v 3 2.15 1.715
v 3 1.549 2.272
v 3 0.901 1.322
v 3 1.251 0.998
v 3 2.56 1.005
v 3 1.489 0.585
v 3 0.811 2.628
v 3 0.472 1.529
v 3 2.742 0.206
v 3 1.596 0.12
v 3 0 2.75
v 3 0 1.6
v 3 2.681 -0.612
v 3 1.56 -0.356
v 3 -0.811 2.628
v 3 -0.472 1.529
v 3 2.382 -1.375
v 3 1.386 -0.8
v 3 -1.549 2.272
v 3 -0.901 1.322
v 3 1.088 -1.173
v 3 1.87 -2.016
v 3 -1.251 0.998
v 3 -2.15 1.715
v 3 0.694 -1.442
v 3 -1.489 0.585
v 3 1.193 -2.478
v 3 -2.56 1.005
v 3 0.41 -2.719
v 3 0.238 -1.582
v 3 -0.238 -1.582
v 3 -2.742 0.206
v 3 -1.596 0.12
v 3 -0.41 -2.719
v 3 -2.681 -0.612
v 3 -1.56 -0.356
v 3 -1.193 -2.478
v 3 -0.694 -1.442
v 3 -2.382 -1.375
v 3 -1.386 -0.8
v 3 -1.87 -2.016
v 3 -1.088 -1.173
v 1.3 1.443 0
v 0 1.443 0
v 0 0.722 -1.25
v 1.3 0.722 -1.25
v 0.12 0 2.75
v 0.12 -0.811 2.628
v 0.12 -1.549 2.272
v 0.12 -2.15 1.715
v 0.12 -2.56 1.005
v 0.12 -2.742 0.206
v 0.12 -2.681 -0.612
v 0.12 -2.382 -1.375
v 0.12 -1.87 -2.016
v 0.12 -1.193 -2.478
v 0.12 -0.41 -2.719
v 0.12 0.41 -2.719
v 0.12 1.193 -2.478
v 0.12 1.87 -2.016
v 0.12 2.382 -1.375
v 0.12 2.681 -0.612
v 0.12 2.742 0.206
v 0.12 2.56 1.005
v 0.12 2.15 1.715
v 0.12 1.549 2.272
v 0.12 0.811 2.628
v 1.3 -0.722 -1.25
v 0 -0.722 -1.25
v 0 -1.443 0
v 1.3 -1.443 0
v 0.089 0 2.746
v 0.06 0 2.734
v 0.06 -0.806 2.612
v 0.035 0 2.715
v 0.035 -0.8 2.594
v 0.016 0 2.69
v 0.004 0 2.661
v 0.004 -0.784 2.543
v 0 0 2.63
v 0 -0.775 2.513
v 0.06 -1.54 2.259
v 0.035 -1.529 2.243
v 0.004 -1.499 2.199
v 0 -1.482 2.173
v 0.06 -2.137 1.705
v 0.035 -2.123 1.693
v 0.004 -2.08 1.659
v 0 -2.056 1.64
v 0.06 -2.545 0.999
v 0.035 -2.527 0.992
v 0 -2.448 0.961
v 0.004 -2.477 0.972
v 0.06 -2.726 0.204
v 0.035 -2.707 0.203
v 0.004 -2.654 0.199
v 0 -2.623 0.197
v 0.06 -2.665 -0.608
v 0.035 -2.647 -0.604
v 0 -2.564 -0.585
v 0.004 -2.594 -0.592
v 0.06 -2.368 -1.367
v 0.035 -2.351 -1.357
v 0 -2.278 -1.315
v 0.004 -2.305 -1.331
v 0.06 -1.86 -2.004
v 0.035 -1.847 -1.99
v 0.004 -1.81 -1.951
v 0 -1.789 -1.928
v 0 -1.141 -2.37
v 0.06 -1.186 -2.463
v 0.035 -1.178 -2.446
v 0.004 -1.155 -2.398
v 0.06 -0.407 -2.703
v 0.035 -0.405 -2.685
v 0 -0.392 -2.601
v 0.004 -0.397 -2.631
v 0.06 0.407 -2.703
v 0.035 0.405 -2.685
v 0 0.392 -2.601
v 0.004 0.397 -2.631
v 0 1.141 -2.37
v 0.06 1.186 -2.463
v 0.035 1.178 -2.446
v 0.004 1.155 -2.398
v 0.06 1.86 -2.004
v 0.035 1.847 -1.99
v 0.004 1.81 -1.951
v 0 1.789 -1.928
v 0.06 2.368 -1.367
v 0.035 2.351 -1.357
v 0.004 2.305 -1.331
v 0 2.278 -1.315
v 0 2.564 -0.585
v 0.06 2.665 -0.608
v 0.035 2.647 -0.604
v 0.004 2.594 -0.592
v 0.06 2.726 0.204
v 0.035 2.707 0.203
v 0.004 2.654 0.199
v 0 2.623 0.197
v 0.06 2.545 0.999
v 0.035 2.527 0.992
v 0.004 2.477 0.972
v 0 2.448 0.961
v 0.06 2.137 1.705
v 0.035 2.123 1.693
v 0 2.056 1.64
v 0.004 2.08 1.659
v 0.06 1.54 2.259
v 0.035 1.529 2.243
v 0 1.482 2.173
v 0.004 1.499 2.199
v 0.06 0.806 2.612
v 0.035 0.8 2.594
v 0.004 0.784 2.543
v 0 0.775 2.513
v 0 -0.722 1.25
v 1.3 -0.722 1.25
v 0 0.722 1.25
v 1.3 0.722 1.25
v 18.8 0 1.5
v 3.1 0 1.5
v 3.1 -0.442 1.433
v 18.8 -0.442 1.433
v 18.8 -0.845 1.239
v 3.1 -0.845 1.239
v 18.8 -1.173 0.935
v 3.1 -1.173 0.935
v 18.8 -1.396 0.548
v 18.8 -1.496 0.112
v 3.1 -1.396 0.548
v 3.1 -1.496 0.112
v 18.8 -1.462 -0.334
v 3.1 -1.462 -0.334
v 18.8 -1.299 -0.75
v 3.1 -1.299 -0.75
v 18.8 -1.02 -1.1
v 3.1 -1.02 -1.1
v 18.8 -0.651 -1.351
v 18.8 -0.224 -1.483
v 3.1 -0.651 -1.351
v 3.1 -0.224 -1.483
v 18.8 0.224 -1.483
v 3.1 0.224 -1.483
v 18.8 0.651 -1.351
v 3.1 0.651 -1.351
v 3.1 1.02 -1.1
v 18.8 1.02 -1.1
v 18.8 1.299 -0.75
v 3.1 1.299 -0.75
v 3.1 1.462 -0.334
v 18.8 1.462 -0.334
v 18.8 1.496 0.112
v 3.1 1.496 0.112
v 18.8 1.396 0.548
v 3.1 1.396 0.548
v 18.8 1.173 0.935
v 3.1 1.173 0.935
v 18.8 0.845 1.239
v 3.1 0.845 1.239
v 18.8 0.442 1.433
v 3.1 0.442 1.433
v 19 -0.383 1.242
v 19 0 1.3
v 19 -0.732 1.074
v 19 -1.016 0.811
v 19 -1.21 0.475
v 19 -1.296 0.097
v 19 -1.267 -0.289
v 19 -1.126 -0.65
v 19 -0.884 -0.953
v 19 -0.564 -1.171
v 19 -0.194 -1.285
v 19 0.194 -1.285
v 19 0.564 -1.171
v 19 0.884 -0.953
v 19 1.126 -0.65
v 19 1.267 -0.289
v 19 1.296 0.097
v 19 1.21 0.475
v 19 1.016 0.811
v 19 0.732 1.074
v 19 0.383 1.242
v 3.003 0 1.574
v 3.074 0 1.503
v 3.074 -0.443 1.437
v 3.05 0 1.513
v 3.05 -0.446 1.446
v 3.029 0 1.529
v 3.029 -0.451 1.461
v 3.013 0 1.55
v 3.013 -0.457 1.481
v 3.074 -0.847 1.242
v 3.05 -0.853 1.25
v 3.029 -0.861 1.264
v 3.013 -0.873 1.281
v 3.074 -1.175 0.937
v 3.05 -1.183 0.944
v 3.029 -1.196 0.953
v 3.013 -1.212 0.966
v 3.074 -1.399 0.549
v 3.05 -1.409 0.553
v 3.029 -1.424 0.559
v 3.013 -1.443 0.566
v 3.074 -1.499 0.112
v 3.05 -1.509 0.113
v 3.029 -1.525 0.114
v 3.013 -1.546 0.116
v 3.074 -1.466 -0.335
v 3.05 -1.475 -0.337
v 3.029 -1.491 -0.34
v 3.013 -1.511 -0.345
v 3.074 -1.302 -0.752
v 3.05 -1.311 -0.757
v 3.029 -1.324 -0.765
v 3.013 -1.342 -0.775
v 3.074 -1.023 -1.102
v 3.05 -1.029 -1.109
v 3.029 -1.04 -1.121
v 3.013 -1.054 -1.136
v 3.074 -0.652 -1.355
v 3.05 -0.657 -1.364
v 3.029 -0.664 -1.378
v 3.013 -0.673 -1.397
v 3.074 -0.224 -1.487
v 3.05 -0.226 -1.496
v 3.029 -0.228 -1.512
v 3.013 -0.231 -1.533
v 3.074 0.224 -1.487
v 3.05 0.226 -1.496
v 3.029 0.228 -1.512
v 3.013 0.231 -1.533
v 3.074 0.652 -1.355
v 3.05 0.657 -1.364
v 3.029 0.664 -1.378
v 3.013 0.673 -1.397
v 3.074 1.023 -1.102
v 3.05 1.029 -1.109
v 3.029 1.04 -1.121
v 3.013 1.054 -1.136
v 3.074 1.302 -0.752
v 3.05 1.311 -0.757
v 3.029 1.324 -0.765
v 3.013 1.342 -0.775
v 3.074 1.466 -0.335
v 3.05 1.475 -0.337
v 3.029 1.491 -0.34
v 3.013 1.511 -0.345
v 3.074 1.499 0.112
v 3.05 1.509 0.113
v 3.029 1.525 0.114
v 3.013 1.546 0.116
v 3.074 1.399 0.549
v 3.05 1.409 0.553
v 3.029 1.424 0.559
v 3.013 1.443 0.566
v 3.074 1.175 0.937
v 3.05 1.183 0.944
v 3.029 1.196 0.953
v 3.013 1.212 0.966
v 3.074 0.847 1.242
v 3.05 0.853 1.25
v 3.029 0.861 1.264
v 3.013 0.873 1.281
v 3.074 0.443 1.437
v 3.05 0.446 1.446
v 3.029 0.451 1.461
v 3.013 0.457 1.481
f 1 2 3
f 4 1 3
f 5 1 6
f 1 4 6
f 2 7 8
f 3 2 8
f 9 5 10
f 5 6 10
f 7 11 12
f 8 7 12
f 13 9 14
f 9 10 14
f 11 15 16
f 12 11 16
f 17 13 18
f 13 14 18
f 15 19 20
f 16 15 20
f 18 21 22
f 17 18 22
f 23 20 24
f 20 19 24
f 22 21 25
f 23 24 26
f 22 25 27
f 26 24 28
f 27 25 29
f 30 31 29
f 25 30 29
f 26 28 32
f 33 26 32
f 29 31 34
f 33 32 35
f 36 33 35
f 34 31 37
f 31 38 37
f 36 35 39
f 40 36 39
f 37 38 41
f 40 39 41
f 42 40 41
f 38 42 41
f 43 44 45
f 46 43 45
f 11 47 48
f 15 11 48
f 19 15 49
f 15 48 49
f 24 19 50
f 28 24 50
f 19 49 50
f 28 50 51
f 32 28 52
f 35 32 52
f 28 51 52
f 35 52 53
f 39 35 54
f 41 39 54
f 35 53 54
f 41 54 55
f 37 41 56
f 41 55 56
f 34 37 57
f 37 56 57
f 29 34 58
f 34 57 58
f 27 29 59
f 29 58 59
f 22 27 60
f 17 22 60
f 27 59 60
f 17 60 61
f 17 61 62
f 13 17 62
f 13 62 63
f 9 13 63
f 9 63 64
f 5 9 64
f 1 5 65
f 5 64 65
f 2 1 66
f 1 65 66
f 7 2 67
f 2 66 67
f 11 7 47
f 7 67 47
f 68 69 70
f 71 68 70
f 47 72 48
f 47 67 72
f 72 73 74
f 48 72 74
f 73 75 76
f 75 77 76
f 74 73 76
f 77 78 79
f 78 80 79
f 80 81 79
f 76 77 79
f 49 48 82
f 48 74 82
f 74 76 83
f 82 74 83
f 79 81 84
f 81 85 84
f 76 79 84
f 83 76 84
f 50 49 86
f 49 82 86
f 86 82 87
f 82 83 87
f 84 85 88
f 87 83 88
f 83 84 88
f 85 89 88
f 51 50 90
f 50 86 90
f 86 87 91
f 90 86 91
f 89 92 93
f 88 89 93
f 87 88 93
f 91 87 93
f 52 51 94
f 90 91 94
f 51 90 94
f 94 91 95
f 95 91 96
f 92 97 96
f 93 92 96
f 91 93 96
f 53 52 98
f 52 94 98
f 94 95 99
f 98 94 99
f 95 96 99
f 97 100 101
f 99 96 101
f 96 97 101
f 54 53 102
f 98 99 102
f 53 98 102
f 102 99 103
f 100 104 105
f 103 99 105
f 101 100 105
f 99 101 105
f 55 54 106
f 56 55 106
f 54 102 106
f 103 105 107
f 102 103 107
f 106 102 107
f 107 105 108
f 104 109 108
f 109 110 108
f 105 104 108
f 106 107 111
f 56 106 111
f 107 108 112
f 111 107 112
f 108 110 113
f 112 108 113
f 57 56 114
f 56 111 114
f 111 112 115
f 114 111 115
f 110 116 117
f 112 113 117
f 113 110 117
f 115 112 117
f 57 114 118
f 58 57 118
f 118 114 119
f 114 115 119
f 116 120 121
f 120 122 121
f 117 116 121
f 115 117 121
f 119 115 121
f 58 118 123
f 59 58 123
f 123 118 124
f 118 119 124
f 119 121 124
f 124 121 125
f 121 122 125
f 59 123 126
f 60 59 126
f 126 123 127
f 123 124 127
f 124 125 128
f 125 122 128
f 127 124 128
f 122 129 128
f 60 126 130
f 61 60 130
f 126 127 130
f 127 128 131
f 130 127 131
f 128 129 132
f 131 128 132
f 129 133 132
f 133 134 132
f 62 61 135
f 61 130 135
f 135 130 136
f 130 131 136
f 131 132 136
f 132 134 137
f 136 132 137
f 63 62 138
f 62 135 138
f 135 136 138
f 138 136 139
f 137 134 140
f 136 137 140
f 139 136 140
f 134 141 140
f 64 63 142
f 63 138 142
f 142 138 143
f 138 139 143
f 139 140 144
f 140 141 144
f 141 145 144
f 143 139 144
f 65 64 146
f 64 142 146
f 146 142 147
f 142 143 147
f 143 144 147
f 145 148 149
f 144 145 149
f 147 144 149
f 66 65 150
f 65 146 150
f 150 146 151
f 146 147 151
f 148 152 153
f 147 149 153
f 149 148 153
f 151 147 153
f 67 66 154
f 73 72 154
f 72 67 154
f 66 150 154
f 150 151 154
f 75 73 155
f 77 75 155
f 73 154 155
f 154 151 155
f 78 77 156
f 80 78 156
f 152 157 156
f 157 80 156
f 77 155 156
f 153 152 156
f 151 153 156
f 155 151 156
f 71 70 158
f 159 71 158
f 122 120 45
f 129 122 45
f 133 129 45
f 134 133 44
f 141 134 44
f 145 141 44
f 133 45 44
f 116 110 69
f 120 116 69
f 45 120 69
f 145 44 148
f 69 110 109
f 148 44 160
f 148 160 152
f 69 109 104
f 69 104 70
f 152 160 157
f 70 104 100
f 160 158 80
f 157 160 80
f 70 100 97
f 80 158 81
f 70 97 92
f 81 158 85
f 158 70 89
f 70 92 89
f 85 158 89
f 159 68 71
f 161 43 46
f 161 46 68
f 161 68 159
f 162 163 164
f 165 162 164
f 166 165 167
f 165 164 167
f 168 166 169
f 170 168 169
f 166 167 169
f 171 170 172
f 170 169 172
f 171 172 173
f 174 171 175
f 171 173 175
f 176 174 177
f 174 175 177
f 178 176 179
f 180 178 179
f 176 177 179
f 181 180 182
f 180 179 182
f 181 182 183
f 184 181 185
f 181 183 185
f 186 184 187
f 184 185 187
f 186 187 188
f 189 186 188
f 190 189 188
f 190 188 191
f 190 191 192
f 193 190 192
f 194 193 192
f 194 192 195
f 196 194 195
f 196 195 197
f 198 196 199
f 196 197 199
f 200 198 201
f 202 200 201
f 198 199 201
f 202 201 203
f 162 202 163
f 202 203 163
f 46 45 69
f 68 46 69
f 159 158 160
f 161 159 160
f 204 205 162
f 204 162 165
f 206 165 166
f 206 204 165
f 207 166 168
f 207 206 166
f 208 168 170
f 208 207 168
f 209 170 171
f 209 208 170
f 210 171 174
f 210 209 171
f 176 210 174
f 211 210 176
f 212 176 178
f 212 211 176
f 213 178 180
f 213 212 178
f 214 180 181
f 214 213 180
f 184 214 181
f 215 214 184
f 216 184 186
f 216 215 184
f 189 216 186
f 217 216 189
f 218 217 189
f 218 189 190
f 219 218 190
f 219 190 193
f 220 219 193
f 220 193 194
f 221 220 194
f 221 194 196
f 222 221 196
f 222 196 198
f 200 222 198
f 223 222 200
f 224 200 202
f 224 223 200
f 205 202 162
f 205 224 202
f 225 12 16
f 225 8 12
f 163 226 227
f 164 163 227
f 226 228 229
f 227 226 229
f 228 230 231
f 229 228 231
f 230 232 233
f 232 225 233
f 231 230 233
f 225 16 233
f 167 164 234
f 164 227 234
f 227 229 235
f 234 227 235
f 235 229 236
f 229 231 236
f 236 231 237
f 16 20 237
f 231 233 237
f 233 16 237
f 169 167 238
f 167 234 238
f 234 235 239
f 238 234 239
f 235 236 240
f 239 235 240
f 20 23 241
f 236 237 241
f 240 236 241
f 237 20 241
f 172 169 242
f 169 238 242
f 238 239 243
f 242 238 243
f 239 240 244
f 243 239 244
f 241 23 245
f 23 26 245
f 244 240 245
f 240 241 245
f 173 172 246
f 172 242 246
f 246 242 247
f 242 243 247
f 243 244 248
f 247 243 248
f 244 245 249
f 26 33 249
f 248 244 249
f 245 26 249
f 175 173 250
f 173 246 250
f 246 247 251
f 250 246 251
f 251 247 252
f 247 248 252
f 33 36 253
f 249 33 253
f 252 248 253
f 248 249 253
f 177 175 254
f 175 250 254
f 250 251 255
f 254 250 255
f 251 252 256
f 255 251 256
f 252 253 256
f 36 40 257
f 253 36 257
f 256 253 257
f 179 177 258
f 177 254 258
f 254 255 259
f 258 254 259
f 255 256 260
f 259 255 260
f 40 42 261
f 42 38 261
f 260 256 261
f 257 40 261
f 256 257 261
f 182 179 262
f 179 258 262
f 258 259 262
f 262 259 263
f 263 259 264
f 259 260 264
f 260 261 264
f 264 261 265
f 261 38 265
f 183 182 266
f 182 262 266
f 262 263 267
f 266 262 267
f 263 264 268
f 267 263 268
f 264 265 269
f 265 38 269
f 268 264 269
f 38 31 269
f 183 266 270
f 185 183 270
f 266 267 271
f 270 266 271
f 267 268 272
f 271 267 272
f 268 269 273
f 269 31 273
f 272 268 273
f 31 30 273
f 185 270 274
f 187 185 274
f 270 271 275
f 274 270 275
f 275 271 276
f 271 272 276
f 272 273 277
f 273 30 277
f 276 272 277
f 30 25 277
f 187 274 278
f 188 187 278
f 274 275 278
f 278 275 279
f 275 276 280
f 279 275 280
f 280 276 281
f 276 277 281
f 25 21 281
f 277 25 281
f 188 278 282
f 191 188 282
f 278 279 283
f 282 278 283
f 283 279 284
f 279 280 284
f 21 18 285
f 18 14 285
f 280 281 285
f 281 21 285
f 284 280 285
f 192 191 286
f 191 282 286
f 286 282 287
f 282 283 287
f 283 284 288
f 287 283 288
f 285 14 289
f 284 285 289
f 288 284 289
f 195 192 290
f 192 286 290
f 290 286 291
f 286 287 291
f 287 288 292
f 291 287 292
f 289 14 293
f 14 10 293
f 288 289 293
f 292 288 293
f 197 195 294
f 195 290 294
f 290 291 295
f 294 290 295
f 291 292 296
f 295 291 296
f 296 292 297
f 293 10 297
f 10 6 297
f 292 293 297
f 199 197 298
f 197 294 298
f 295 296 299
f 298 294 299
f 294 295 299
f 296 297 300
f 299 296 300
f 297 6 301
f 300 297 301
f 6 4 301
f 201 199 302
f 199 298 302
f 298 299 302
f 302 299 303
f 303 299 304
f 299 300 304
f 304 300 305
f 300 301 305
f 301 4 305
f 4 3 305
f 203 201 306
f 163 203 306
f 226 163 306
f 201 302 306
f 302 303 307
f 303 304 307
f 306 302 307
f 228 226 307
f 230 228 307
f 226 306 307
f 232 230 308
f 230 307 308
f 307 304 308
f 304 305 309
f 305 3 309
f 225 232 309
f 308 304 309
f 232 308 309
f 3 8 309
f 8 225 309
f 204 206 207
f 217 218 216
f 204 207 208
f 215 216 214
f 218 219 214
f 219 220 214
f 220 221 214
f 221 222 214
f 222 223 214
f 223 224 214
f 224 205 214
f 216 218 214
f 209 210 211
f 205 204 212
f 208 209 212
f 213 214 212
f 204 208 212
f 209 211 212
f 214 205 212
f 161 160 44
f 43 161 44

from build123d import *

# Parameters (mm, degrees)
FILLET1_R      = 0.1
FILLET2_R      = 0.12
CHAMFER1_SIZE  = 0.2
EXTRUDE1_DEPTH = 1.3


with BuildPart() as part:
    # Sketch1 → Revolve1 (revolve)
    with BuildSketch(Plane.XY, mode=Mode.PRIVATE) as revolve1_sk:
        Polygon((3, 1.5), (3, 0), (4.279914881, 0), (19, 0), (19, 1.5), align=None)
        Polygon((0, 2.75), (0, 0), (3, 0), (3, 1.5), (3, 2.75), align=None)
    revolve(revolve1_sk.sketch.rotate(Axis((0, 0, 0), (1, 0, 0)), 90), axis=Axis((0, 0, 0), (1, 0, 0)))

    # Fillet1
    fillet1_edges = [part.edges().sort_by_distance(p)[0] for p in [
        (3, 0, -1.5),
    ]]
    fillet(fillet1_edges, radius=FILLET1_R)

    # Fillet2
    fillet2_edges = [part.edges().sort_by_distance(p)[0] for p in [
        (0, 0, -2.75),
    ]]
    fillet(fillet2_edges, radius=FILLET2_R)

    # Chamfer1
    chamfer1_edges = [part.edges().sort_by_distance(p)[0] for p in [
        (19, 0, -1.5),
    ]]
    chamfer(chamfer1_edges, length=CHAMFER1_SIZE)

    # Sketch2 → Extrude1 (cut)
    with BuildSketch(Plane.ZY):
        Polygon((0, 1.443375673), (-1.25, 0.721687836), (-1.25, -0.721687836), (0, -1.443375673), (1.25, -0.721687836), (1.25, 0.721687836), align=None)
    extrude(amount=-EXTRUDE1_DEPTH, mode=Mode.SUBTRACT)


solid = part.part
